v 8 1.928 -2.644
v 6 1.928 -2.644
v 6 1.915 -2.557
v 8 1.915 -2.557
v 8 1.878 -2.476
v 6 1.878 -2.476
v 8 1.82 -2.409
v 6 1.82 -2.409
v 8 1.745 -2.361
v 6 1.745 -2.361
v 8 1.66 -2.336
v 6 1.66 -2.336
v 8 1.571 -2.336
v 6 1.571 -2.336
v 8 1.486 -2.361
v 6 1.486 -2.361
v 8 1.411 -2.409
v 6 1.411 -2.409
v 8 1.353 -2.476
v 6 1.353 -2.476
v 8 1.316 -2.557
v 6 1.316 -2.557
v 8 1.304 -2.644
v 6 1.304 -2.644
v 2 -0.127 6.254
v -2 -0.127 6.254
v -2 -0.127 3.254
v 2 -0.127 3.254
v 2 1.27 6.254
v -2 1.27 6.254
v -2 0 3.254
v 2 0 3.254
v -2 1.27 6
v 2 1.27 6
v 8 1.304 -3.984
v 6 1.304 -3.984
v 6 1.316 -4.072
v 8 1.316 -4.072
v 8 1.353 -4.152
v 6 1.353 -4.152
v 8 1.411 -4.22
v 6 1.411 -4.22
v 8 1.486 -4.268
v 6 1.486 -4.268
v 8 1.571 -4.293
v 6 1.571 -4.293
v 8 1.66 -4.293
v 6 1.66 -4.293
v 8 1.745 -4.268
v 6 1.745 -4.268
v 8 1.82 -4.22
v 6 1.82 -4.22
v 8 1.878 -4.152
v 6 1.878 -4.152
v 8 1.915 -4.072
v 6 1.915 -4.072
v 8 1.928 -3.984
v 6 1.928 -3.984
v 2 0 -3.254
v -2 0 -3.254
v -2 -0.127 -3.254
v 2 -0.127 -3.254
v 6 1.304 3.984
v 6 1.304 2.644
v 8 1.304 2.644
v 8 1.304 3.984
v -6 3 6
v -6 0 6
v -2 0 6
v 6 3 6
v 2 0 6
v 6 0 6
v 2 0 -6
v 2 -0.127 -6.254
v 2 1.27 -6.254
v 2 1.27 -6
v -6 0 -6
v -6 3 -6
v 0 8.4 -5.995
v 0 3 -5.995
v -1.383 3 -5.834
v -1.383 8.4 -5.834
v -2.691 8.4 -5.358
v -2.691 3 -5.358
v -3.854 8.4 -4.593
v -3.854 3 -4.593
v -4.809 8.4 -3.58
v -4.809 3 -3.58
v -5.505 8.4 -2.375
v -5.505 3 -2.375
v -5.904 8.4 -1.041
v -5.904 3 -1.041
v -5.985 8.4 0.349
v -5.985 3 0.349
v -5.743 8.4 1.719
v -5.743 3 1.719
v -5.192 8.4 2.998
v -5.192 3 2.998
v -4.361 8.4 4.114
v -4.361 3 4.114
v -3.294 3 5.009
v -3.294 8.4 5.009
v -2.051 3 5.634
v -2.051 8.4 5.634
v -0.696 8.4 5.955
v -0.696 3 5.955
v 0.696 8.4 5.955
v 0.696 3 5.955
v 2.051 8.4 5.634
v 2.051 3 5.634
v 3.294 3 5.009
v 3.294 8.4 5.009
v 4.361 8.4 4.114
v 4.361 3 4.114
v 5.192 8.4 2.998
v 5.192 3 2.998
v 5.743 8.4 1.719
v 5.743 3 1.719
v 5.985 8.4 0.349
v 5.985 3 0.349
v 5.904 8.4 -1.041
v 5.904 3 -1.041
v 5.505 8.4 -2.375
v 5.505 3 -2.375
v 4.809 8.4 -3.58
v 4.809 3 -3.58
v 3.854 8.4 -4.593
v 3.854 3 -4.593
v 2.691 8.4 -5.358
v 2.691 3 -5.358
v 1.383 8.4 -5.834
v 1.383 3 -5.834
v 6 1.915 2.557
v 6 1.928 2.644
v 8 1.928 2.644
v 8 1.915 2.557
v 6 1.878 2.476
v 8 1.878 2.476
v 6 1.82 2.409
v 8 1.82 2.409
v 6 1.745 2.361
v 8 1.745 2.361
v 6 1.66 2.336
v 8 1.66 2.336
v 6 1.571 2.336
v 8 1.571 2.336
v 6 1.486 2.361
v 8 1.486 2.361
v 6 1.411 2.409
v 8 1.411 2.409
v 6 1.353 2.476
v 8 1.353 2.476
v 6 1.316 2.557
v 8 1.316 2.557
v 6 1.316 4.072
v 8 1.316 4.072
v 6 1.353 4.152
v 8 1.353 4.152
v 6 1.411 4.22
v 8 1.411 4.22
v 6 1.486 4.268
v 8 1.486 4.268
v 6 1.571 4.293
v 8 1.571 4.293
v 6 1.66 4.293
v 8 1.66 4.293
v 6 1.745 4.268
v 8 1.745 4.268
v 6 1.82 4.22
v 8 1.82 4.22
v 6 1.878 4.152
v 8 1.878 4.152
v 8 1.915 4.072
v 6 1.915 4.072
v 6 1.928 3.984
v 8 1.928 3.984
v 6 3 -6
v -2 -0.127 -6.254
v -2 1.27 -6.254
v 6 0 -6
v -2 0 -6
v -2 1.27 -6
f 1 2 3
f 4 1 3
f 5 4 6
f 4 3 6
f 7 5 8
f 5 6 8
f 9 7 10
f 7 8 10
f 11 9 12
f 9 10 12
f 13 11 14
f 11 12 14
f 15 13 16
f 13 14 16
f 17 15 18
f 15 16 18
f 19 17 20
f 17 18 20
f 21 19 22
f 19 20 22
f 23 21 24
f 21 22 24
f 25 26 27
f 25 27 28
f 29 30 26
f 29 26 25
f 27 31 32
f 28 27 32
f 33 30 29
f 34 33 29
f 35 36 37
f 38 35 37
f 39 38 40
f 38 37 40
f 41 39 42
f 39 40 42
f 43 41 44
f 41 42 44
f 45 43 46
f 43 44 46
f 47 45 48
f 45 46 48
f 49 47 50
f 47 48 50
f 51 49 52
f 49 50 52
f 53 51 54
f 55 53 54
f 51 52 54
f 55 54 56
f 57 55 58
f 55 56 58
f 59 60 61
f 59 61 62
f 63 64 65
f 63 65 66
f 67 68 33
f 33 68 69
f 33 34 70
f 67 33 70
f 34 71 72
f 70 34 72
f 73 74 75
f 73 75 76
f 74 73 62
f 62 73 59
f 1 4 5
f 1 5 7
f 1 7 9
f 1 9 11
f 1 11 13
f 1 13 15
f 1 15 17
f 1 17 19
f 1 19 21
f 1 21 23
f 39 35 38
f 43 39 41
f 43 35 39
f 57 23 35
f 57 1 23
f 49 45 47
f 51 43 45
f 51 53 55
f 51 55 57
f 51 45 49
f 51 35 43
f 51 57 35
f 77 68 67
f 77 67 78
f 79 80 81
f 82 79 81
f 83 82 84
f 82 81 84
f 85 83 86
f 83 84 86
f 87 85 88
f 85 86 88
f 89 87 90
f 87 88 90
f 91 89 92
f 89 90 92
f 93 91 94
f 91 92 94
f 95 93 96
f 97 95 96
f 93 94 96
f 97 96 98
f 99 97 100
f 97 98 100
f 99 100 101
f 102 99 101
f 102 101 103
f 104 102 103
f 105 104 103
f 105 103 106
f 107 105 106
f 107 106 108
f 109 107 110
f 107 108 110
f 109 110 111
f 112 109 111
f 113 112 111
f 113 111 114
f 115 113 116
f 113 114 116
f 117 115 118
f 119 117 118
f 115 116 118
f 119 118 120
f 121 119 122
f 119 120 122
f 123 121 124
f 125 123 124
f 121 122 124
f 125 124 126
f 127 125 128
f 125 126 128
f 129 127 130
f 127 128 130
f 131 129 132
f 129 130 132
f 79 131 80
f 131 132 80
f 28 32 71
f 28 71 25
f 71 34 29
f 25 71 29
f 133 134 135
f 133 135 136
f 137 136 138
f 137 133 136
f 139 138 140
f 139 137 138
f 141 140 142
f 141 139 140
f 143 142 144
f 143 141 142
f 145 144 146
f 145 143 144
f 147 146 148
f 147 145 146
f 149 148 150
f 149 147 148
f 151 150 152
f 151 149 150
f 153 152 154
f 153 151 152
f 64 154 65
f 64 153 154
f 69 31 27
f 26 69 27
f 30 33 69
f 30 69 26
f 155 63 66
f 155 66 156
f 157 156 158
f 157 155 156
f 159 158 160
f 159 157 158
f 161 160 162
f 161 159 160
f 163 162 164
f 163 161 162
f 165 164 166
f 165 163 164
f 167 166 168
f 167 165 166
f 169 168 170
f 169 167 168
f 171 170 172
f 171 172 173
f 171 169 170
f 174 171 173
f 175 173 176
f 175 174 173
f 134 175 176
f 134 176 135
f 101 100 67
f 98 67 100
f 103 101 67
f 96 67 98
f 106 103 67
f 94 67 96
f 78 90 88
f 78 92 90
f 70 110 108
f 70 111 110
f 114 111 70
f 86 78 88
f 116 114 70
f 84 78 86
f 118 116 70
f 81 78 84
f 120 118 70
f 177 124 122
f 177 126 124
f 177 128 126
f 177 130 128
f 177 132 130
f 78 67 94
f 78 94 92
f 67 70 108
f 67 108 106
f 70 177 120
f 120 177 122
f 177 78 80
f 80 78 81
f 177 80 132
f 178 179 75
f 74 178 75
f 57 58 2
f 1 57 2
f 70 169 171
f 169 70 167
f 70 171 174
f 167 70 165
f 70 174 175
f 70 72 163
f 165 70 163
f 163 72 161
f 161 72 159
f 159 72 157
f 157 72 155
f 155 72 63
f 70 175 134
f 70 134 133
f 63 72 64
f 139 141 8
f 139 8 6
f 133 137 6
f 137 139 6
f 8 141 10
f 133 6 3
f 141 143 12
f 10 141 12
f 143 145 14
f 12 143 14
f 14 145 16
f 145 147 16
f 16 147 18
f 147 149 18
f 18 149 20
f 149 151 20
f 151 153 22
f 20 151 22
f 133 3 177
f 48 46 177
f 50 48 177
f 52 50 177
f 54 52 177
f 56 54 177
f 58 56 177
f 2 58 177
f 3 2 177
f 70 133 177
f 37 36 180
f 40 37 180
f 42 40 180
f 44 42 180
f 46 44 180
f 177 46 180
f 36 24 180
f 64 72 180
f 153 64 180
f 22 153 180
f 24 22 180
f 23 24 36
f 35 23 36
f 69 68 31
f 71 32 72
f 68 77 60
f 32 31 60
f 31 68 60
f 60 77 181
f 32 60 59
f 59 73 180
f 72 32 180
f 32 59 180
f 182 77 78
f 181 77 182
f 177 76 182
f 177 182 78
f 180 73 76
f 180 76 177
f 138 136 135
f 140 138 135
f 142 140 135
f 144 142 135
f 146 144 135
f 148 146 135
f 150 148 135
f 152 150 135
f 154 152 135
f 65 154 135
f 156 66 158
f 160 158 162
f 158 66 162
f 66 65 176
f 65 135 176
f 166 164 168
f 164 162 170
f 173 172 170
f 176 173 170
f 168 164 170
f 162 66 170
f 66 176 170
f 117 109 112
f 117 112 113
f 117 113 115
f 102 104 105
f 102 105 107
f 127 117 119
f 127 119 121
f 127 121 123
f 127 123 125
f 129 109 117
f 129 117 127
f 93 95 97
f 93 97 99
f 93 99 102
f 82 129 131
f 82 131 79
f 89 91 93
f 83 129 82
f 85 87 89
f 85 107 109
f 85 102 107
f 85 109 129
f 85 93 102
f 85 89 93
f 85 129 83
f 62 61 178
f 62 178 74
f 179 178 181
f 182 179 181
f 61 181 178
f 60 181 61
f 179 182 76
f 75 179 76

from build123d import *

# Parameters (mm, degrees)
SKETCH1_W                = 12
SKETCH1_H                = 12
BOSS_EXTRUDE1_DEPTH      = 3
SKETCH2_R                = 5.995277692
BOSS_EXTRUDE2_DEPTH      = 5.4
BOSS_EXTRUDE3_DEPTH      = 2
BOSS_EXTRUDE4_DEPTH      = 0.127
BOSS_EXTRUDE4_DEPTH_BACK = 1.27
SKETCH4_W                = 4
SKETCH4_H                = 3


with BuildPart() as part:
    # Sketch1 → Boss-Extrude1 (new body)
    with BuildSketch(Plane(origin=(0, 0, 0), x_dir=(1, 0, 0), z_dir=(0, 1, 0))):
        Rectangle(SKETCH1_W, SKETCH1_H)
    extrude(amount=BOSS_EXTRUDE1_DEPTH)

    # Sketch2 → Boss-Extrude2 (add)
    with BuildSketch(Plane(origin=(0, 3, 0), x_dir=(1, 0, 0), z_dir=(0, 1, 0))):
        with Locations(Location((0, 0, 0), (0, 0, 90))):
            Circle(SKETCH2_R)
    extrude(amount=BOSS_EXTRUDE2_DEPTH)

    # Sketch3 → Boss-Extrude3 (add)
    with BuildSketch(Plane(origin=(6, 0, 0), x_dir=(0, 0, -1), z_dir=(1, 0, 0))):
        with BuildLine():
            Line((-3.983677321, 1.927671256), (-2.644454293, 1.927671256))
            ThreePointArc((-2.644454293, 1.927671256), (-2.332402325, 1.615619288), (-2.644454293, 1.303567321))
            Line((-2.644454293, 1.303567321), (-3.983677321, 1.303567321))
            ThreePointArc((-3.983677321, 1.303567321), (-4.295729288, 1.615619288), (-3.983677321, 1.927671256))
        make_face()
        with BuildLine():
            Line((3.983677321, 1.927671256), (2.644454293, 1.927671256))
            ThreePointArc((2.644454293, 1.927671256), (2.332402325, 1.615619288), (2.644454293, 1.303567321))
            Line((2.644454293, 1.303567321), (3.983677321, 1.303567321))
            ThreePointArc((3.983677321, 1.303567321), (4.295729288, 1.615619288), (3.983677321, 1.927671256))
        make_face()
    extrude(amount=BOSS_EXTRUDE3_DEPTH)

    # Sketch4 → Boss-Extrude4 (add, two sides: drawn at the far end of the back side and taken through both)
    with BuildSketch(Plane.XZ.offset(-BOSS_EXTRUDE4_DEPTH_BACK)):
        with Locations((0, 4.754)):
            Rectangle(SKETCH4_W, SKETCH4_H)
        with Locations((0, -4.754)):
            Rectangle(SKETCH4_W, SKETCH4_H)
    extrude(amount=BOSS_EXTRUDE4_DEPTH + BOSS_EXTRUDE4_DEPTH_BACK)


solid = part.part
